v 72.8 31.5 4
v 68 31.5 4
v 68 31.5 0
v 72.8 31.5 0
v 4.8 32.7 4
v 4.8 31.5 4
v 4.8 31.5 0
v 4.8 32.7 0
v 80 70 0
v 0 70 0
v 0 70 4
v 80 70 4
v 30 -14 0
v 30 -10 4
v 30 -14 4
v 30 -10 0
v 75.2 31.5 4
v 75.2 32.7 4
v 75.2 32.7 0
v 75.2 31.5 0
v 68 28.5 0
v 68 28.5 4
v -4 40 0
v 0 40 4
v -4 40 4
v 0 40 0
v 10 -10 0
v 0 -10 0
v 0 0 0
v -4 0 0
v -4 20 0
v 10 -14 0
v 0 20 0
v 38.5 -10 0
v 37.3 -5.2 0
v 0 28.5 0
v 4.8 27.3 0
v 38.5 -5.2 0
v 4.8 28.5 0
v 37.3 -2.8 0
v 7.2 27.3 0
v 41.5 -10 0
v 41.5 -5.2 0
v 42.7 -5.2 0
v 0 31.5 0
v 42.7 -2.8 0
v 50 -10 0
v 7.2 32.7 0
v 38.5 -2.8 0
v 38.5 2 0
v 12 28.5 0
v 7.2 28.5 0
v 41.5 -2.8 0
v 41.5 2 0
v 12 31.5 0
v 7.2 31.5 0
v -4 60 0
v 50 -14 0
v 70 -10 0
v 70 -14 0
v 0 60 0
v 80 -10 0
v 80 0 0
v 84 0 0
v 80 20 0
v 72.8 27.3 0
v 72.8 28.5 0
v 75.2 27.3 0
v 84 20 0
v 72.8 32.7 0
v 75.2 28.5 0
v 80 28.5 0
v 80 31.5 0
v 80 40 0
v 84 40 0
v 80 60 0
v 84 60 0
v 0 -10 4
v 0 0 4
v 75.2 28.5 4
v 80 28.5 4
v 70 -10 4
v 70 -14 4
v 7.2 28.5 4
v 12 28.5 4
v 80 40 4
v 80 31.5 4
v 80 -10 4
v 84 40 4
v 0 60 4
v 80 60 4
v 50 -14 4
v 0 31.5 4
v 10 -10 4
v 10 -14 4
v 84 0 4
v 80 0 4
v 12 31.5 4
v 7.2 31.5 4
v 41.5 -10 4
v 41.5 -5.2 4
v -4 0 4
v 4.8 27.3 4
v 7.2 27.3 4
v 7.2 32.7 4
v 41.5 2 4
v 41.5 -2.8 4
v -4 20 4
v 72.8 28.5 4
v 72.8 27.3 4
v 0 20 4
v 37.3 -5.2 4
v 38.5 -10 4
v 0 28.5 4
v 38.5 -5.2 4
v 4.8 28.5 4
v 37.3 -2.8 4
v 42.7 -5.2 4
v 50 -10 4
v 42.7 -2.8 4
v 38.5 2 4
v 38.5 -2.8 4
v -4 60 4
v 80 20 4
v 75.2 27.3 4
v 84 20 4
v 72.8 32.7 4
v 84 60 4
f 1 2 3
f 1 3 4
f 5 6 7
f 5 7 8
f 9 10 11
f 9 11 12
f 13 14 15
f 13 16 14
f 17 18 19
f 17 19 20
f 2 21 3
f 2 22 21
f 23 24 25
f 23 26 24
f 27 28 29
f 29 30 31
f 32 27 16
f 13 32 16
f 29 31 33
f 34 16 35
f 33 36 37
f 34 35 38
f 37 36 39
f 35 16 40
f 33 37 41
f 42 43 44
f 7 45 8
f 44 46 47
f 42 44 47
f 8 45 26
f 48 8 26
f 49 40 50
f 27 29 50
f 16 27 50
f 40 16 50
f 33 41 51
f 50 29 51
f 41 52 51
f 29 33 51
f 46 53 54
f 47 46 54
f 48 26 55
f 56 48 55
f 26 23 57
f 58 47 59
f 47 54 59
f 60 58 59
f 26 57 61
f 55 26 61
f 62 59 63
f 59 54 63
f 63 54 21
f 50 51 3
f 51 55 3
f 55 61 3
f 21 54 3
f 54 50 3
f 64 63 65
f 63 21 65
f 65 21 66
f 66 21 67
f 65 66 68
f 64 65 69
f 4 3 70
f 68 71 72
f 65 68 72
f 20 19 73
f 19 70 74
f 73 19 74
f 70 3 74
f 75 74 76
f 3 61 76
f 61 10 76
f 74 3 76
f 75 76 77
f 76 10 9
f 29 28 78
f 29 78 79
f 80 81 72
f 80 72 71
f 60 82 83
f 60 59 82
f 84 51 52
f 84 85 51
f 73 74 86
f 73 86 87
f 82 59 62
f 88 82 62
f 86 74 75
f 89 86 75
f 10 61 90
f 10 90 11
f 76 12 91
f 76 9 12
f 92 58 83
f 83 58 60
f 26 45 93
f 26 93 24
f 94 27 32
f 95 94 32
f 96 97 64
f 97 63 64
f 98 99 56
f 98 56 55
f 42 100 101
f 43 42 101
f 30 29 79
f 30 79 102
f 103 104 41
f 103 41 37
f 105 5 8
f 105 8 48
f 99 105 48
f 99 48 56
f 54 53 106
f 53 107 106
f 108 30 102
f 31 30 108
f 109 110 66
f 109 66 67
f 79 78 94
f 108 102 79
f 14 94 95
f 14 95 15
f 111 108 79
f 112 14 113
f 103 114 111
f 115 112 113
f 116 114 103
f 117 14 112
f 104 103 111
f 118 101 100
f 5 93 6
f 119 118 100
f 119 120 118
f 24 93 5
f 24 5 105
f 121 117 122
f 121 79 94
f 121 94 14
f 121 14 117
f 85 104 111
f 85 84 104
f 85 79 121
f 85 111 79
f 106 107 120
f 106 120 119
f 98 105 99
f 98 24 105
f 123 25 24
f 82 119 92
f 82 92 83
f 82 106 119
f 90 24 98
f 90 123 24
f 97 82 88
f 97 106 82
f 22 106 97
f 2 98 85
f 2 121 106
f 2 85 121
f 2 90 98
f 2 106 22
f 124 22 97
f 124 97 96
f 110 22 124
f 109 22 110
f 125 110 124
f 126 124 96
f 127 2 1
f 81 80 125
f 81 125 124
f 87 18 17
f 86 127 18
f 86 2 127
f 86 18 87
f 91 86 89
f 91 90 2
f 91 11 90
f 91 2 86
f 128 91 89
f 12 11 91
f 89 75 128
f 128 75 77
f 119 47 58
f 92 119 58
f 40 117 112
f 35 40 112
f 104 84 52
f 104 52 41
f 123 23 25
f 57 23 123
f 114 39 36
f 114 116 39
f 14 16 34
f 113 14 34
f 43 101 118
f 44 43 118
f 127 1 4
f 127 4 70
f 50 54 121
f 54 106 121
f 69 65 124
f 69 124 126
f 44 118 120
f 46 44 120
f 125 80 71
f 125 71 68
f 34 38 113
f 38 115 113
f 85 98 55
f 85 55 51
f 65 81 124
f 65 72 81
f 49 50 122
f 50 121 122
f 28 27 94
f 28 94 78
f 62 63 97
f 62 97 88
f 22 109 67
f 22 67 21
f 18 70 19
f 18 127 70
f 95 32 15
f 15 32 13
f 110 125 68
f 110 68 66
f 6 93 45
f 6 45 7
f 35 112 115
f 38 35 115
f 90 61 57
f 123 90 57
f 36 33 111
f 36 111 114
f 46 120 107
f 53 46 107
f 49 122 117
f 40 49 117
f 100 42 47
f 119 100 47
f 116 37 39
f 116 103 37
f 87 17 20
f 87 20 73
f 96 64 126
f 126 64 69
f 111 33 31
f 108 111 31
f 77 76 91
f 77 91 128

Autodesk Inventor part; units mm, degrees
ref_plane "YZ Plane" through (0, 0, 0) normal (1, 0, 0) x (0, 1, 0)
ref_plane "XZ Plane" through (0, 0, 0) normal (0, 1, 0) x (-1, 0, 0)
ref_plane "XY Plane" through (0, 0, 0) normal (0, 0, 1) x (1, 0, 0)
sketch "Sketch1" plane through (0, 0, 0) normal (0, 0, 1) x (1, 0, 0)
  line L0 (0, 0) -> (0, 20) construction
  line L1 (0, 20) -> (-4, 20) projected
  line L2 (-4, 0) -> (-4, 20) projected
  line L3 (0, 0) -> (-4, 0) projected
  line L4 (0, 40) -> (0, 60) construction
  line L5 (0, 60) -> (-4, 60) projected
  line L6 (-4, 40) -> (-4, 60) projected
  line L7 (0, 40) -> (-4, 40) projected
  line L8 (0, 70) -> (-4, 70) construction
  line L9 (0, 70) -> (80, 70)
  line L10 (80, 70) -> (80, 60)
  line L11 (80, -10) -> (0, -10) construction
  line L12 (0, -10) -> (0, 0)
  line L13 (40, 70) -> (40, -10) construction
  line L14 (0, 60) -> (0, 70)
  line L15 (0, 40) -> (0, 60) construction
  line L16 (0, 20) -> (0, 40)
  line L17 (0, 0) -> (0, 20) construction
  line L18 (80, 20) -> (84, 20)
  line L19 (84, 0) -> (84, 20)
  line L20 (80, 0) -> (84, 0)
  line L21 (80, 60) -> (84, 60)
  line L22 (84, 40) -> (84, 60)
  line L23 (80, 40) -> (84, 40)
  line L24 (80, 70) -> (84, 70) construction
  line L25 (80, 60) -> (80, 40) construction
  line L26 (80, 40) -> (80, 20)
  line L27 (80, 20) -> (80, 0) construction
  line L28 (80, 0) -> (80, -10)
  line L29 (10, -10) -> (10, -14)
  line L30 (10, -14) -> (30, -14)
  line L31 (30, -10) -> (30, -14)
  line L32 (50, -10) -> (50, -14)
  line L33 (50, -14) -> (70, -14)
  line L34 (70, -10) -> (70, -14)
  line L35 (10, -10) -> (0, -10)
  line L36 (30, -10) -> (50, -10)
  line L37 (70, -10) -> (80, -10)
  point P0 (40, 30)
  dimension "d0" = 80
  dimension "d1" = 80
  dimension "d6" = 90
extrude "Extrusion1" add sketch "Sketch1" along normal blind 4
sketch "Sketch2" plane through (0, 0, 4) normal (0, 0, 1) x (1, 0, 0)
  line L0 (0, 20) -> (-4, 20) construction
  line L1 (-4, 20) -> (-4, 0) construction
  line L2 (-4, 0) -> (0, 0) construction
  line L3 (0, 0) -> (0, -10) construction
  line L4 (0, -10) -> (10, -10) construction
  line L5 (10, -10) -> (10, -14) construction
  line L6 (10, -14) -> (30, -14) construction
  line L7 (30, -14) -> (30, -10) construction
  line L8 (30, -10) -> (50, -10) construction
  line L9 (50, -10) -> (50, -14) construction
  line L10 (50, -14) -> (70, -14) construction
  line L11 (70, -14) -> (70, -10) construction
  line L12 (70, -10) -> (80, -10) construction
  line L13 (80, -10) -> (80, 0) construction
  line L14 (80, 0) -> (84, 0) construction
  line L15 (84, 0) -> (84, 20) construction
  line L16 (84, 20) -> (80, 20) construction
  line L17 (80, 20) -> (80, 40) construction
  line L18 (80, 40) -> (84, 40) construction
  line L19 (84, 40) -> (84, 60) construction
  line L20 (84, 60) -> (80, 60) construction
  line L21 (80, 60) -> (80, 70) construction
  line L22 (80, 70) -> (0, 70) construction
  line L23 (0, 70) -> (0, 60) construction
  line L24 (0, 60) -> (-4, 60) construction
  line L25 (-4, 60) -> (-4, 40) construction
  line L26 (-4, 40) -> (0, 40) construction
  line L27 (0, 40) -> (0, 20) construction
  line L28 (0, 31.5) -> (12, 31.5)
  line L29 (12, 31.5) -> (12, 28.5)
  line L30 (12, 28.5) -> (0, 28.5)
  line L31 (0, 28.5) -> (0, 31.5)
  line L32 (80, 28.5) -> (68, 28.5)
  line L33 (68, 28.5) -> (68, 31.5)
  line L34 (68, 31.5) -> (80, 31.5)
  line L35 (80, 31.5) -> (80, 28.5)
  line L36 (0, 40) -> (0, 20) projected
  line L37 (4.8, 32.7) -> (7.2, 32.7)
  line L38 (7.2, 32.7) -> (7.2, 27.3)
  line L39 (7.2, 27.3) -> (4.8, 27.3)
  line L40 (4.8, 27.3) -> (4.8, 32.7)
  line L41 (72.8, 32.7) -> (75.2, 32.7)
  line L42 (75.2, 32.7) -> (75.2, 27.3)
  line L43 (75.2, 27.3) -> (72.8, 27.3)
  line L44 (72.8, 27.3) -> (72.8, 32.7)
  line L45 (38.5, -10) -> (41.5, -10)
  line L46 (41.5, -10) -> (41.5, 2)
  line L47 (41.5, 2) -> (38.5, 2)
  line L48 (38.5, 2) -> (38.5, -10)
  line L49 (37.3, -5.2) -> (42.7, -5.2)
  line L50 (42.7, -5.2) -> (42.7, -2.8)
  line L51 (42.7, -2.8) -> (37.3, -2.8)
  line L52 (37.3, -2.8) -> (37.3, -5.2)
  line L53 (30, -10) -> (50, -10) projected
  point P0 (7.2, 30)
  point P1 (72.8, 30)
  point P2 (68, 30)
  point P3 (12, 30)
  point P4 (6, 32.7)
  point P5 (6, 31.5)
  point P6 (74, 32.7)
  point P7 (74, 31.5)
  point P8 (0, 30)
  point P9 (0, 30)
  point P10 (37.3, -4)
  point P11 (38.5, -4)
  point P12 (40, -2.8)
  point P13 (40, 2)
  point P14 (40, -10)
  point P15 (40, -10)
  point P16 (40, -10)
  point P17 (4.8, 31.5)
  point P18 (4.8, 28.5)
  point P19 (7.2, 28.5)
  point P20 (7.2, 31.5)
  point P21 (38.5, -5.2)
  point P22 (41.5, -5.2)
  point P23 (41.5, -2.8)
  point P24 (38.5, -2.8)
  point P25 (72.8, 28.5)
  point P26 (75.2, 28.5)
  point P27 (75.2, 31.5)
  point P28 (72.8, 31.5)
  dimension "d8" = 2.4
  dimension "d9" = 5.4
  dimension "d10" = 3
  dimension "d11" = 12
extrude "Extrusion2" cut sketch "Sketch2" against normal up to next
properties part number "Car_Left" material "MDF Medium Density Fiberboard"
